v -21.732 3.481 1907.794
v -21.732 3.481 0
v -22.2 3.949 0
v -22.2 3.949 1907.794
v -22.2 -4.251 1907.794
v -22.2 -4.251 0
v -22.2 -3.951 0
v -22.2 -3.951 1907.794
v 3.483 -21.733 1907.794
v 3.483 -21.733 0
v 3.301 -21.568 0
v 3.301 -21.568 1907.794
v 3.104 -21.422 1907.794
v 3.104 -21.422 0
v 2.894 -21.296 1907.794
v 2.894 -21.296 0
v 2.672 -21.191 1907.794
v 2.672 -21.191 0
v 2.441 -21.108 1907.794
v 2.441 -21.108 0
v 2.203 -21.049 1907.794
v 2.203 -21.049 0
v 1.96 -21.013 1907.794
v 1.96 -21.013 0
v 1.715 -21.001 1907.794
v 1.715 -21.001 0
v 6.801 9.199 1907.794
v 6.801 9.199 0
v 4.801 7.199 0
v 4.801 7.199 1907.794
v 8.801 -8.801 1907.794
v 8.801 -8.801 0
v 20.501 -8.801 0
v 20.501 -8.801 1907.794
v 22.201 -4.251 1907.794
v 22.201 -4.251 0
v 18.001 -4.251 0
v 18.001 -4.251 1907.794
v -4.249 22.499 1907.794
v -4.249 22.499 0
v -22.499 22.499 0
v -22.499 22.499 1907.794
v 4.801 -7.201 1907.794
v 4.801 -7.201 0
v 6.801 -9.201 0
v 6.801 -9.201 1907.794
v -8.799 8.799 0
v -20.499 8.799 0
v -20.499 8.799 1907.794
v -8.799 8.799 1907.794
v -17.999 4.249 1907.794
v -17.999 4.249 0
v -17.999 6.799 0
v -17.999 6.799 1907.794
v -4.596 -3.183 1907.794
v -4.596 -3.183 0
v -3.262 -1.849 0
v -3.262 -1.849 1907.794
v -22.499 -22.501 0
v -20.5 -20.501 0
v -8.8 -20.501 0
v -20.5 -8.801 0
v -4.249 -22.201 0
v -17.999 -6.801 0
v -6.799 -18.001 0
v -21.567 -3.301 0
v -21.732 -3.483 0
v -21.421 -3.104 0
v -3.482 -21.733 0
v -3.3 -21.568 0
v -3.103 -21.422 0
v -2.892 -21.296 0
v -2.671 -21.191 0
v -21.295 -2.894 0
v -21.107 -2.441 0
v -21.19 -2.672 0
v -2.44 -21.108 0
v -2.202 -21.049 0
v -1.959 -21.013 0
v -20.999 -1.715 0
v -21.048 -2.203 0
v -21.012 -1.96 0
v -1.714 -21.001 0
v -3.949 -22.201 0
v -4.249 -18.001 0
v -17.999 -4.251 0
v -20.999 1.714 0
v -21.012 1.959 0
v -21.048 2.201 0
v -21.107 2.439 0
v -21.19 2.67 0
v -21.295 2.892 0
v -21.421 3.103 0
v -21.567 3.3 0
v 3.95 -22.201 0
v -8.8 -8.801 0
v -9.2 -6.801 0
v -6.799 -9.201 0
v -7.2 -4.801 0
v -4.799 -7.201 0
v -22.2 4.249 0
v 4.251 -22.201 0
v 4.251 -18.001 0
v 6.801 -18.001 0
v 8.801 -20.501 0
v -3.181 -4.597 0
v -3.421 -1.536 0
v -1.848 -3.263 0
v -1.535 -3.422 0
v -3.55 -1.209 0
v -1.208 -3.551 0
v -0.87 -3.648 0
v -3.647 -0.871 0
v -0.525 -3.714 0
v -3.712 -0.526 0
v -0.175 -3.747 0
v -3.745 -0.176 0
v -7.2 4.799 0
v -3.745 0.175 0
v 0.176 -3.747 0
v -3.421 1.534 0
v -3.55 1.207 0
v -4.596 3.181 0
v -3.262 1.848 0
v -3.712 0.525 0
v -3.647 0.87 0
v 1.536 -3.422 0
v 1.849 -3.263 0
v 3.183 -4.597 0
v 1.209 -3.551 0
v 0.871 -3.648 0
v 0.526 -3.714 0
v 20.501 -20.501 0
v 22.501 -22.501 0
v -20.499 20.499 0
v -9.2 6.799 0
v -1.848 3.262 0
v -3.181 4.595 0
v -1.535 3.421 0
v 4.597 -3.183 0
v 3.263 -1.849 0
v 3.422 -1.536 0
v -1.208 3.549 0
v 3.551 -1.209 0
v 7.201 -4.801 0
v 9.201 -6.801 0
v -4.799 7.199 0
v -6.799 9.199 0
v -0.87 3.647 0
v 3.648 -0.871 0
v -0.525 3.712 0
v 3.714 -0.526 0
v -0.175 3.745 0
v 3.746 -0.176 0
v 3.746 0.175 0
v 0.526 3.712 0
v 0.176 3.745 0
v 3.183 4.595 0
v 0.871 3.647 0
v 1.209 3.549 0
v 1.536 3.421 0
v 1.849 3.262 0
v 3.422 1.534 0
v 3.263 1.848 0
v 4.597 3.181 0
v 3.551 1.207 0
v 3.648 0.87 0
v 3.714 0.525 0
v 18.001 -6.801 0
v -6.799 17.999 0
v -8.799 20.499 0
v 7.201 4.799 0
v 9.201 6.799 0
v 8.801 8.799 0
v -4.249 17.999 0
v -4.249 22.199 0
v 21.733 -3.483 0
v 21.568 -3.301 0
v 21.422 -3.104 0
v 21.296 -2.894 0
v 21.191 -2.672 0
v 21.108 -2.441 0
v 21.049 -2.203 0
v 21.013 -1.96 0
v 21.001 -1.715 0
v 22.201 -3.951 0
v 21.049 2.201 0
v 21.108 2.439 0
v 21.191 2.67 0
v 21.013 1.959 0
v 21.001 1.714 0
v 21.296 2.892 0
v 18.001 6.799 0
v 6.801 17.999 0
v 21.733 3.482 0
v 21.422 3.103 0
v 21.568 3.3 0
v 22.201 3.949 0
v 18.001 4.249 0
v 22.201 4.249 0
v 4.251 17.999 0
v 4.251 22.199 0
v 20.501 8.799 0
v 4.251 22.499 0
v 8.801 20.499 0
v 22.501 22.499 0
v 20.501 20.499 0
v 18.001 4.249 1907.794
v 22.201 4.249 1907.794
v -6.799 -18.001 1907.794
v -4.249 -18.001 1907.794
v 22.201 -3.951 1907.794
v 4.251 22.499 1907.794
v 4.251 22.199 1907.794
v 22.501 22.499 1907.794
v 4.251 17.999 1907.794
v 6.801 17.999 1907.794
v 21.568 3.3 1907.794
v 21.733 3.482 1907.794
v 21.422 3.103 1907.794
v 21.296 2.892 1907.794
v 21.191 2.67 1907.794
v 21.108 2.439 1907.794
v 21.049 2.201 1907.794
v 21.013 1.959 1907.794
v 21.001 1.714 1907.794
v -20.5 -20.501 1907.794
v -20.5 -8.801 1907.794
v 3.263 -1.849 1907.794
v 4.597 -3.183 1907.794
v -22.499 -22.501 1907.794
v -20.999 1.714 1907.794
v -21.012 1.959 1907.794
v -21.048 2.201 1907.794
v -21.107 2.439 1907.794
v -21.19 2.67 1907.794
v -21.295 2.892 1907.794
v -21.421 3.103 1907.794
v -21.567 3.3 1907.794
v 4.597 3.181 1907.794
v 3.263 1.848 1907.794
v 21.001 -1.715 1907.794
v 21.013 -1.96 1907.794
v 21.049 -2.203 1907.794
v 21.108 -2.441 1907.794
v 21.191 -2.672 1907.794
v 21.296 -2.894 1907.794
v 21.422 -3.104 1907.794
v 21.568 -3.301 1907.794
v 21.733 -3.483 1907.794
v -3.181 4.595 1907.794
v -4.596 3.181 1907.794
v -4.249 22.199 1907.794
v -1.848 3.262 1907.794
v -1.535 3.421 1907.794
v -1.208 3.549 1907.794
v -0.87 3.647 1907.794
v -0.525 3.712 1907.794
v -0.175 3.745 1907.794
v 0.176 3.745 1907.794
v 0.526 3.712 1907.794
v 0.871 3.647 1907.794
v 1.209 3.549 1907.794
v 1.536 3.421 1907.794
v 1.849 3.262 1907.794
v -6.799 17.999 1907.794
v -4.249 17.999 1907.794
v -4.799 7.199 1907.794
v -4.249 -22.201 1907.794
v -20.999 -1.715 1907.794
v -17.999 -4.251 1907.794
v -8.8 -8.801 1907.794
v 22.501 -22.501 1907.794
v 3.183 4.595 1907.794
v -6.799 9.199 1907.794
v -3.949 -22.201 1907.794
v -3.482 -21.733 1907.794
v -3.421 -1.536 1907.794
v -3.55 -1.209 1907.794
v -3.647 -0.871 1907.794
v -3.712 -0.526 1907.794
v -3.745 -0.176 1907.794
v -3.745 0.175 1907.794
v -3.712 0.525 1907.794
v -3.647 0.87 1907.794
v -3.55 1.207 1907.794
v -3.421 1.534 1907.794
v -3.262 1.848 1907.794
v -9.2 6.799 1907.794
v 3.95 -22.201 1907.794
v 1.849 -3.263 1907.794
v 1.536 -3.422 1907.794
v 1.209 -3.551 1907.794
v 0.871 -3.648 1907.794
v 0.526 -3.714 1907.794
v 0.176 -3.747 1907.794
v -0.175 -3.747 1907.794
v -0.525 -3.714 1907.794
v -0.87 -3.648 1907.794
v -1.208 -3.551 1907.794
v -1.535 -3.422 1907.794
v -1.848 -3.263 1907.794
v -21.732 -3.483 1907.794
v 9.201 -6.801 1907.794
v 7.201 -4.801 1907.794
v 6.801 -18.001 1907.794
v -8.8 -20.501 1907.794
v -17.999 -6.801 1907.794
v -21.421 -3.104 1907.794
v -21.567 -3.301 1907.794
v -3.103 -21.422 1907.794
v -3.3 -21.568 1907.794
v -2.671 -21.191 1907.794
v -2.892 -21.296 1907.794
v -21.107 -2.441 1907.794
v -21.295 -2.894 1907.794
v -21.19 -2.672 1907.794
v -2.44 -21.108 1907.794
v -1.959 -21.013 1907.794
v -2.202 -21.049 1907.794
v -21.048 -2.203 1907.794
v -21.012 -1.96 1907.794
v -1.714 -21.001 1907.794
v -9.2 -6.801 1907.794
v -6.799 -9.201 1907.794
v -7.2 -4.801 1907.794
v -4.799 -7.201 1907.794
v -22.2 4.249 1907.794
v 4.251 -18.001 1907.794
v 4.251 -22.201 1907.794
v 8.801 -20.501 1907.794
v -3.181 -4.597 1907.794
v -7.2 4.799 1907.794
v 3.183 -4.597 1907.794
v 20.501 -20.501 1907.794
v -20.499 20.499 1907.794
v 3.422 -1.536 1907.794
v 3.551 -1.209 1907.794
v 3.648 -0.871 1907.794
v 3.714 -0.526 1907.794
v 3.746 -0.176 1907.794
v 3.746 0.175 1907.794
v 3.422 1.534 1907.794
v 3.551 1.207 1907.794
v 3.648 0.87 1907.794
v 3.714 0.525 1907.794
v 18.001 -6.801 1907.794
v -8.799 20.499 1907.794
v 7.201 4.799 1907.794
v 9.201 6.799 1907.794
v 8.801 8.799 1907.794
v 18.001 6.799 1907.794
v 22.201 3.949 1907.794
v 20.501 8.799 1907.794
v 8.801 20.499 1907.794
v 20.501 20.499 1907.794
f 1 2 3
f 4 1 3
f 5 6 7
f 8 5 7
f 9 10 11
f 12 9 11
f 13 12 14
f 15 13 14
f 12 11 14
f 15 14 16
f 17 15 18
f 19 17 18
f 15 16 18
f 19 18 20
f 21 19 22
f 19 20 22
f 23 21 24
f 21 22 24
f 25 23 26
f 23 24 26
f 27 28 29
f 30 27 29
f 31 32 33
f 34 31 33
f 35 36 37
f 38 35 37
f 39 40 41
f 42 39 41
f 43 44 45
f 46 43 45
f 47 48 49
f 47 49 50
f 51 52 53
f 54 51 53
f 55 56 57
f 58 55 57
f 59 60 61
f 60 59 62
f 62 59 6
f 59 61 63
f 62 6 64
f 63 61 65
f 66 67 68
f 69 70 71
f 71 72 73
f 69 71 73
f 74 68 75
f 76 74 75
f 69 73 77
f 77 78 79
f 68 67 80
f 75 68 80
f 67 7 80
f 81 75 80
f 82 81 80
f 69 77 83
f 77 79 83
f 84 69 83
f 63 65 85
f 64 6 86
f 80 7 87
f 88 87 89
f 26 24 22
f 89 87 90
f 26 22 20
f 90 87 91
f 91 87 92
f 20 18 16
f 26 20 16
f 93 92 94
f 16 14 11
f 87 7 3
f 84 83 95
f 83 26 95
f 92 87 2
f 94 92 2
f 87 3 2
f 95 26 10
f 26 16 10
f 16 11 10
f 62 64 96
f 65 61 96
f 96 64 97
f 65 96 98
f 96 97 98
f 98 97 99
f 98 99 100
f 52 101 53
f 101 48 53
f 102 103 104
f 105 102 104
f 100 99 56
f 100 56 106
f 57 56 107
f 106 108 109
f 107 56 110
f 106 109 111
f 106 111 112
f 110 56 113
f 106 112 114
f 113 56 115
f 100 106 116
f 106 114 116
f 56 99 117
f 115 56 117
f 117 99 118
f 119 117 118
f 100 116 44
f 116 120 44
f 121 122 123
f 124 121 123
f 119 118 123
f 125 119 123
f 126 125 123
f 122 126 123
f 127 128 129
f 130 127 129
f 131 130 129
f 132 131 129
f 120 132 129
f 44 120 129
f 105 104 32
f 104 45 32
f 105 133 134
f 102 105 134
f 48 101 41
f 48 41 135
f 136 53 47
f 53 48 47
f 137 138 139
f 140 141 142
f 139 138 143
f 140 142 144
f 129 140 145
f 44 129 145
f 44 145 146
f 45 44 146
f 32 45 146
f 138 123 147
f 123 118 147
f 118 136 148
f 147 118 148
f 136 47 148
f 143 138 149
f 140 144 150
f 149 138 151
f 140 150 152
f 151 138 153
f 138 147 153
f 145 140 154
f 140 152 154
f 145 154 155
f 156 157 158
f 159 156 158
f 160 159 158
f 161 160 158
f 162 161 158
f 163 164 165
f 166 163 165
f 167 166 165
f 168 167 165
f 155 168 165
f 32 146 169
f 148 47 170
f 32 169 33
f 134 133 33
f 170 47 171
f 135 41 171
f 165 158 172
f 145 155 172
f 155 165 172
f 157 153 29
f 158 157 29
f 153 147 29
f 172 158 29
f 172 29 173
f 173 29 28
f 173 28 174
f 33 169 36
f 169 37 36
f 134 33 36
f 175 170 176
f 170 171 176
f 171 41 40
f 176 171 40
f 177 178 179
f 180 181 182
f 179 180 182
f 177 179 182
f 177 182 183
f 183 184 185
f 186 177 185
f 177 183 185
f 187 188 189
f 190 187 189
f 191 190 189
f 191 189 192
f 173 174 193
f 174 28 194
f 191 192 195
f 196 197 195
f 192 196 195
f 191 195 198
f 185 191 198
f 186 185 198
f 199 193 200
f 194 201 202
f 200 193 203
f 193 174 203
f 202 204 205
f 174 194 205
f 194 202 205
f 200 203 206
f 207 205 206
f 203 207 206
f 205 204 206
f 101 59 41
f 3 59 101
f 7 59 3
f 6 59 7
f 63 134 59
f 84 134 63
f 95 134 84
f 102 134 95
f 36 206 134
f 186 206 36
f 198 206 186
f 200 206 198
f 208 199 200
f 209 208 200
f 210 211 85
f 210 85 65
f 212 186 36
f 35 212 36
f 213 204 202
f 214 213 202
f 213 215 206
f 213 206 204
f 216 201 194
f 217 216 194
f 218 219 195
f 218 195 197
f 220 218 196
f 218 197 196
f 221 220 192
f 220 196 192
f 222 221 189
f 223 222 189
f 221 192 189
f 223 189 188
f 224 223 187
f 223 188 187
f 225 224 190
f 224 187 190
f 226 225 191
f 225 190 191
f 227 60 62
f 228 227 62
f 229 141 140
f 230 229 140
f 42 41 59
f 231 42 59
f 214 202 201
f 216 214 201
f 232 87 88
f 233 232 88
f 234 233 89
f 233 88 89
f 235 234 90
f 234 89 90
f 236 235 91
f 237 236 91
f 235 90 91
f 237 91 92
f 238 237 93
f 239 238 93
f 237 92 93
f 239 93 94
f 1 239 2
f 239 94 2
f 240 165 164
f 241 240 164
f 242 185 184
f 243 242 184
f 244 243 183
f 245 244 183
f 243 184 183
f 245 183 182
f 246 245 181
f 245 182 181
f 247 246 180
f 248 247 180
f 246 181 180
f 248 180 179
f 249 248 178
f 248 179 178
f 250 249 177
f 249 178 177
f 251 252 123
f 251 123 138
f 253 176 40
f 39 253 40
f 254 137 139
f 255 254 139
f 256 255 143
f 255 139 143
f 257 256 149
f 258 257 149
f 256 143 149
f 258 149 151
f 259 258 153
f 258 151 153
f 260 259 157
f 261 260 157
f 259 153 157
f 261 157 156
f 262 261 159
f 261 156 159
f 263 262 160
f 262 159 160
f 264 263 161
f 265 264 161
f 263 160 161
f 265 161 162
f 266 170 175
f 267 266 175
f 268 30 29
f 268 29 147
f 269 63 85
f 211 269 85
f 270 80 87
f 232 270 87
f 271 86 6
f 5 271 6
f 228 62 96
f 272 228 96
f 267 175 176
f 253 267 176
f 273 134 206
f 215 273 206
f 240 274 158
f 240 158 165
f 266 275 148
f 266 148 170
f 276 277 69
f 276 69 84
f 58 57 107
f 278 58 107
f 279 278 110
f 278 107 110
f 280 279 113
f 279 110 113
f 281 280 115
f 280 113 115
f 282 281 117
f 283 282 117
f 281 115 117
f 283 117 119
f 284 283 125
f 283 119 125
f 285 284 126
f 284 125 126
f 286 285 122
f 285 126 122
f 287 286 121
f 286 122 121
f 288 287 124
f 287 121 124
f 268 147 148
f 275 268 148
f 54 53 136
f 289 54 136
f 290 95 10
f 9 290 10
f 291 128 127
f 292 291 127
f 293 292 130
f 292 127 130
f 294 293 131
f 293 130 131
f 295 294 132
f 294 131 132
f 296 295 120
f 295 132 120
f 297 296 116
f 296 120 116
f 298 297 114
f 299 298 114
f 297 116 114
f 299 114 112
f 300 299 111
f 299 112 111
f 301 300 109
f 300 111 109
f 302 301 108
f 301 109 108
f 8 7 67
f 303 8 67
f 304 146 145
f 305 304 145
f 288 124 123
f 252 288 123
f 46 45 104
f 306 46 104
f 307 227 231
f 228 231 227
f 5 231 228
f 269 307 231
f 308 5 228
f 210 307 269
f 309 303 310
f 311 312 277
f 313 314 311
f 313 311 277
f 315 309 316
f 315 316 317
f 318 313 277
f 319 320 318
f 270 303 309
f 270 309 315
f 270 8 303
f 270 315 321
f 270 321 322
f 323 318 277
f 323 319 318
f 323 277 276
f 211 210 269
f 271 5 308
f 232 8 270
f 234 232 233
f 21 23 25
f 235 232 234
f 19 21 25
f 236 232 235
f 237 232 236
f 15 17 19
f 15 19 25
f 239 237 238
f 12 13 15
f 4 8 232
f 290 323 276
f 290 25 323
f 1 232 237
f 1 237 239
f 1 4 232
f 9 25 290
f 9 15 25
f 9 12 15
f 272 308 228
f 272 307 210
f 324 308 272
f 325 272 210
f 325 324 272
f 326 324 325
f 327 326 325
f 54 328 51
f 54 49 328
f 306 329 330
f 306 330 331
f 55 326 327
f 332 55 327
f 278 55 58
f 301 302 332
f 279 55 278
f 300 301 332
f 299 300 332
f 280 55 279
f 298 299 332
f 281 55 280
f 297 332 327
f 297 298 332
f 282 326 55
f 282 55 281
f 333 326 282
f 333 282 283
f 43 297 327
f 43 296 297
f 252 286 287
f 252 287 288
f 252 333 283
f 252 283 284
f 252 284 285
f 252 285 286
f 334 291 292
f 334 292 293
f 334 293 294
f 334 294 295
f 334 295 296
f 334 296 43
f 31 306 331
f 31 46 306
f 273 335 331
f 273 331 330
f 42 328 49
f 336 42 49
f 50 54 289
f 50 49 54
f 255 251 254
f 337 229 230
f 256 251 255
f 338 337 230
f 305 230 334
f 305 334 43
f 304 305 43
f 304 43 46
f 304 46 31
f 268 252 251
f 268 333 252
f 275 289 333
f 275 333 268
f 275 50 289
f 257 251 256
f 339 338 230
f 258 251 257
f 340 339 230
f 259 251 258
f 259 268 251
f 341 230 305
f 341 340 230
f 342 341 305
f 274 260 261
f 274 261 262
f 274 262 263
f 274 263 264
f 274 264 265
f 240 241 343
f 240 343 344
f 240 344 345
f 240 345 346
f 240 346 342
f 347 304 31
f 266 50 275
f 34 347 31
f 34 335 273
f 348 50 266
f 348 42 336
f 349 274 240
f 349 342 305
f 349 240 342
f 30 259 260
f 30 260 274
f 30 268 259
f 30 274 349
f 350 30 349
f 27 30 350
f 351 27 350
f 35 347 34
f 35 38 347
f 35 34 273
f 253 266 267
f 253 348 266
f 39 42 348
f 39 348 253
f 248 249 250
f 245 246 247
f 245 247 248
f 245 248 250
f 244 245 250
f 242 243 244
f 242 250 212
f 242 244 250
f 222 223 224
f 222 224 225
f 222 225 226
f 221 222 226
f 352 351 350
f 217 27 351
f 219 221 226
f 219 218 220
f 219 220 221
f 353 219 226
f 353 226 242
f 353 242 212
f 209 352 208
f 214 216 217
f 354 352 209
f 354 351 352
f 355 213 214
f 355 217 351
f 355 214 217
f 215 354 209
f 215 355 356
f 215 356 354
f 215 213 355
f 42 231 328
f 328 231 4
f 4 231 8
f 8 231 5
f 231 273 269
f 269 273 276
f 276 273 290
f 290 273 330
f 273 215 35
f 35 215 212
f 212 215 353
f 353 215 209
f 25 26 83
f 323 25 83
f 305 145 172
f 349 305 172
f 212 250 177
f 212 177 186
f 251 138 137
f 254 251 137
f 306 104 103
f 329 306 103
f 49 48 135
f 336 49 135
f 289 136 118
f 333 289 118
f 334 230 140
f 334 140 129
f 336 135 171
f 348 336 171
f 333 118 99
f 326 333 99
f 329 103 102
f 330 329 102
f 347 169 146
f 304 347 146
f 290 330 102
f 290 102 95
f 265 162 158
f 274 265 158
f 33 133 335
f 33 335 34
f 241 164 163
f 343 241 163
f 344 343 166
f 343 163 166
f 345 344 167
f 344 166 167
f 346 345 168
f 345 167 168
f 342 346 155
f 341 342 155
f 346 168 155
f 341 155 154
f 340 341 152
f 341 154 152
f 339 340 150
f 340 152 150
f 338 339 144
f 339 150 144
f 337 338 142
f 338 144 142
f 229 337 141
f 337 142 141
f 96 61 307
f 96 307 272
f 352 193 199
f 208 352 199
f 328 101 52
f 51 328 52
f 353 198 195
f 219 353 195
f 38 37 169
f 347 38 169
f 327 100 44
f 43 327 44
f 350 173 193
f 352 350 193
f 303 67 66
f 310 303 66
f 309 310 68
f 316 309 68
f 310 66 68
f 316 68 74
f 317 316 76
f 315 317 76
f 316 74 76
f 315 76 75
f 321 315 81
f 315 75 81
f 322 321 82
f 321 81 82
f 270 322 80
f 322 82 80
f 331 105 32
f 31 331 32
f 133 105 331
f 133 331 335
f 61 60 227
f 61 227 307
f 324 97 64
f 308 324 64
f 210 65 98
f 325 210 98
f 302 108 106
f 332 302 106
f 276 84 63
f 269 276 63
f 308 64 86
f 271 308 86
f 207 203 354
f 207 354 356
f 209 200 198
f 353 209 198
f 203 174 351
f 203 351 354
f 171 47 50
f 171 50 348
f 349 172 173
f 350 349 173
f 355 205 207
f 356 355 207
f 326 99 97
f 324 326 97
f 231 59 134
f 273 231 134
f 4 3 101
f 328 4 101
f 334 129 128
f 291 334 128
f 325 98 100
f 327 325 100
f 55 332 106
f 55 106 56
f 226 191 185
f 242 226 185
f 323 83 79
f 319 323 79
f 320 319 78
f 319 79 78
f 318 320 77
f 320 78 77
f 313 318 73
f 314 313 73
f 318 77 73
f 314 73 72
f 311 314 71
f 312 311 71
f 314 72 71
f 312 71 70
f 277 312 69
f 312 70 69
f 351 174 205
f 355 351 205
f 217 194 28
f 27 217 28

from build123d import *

# Parameters (mm, degrees)
SKETCH1_W           = 11.699975178
SKETCH1_H           = 11.699996949
SKETCH1_W_2         = 11.699990436
SKETCH1_H_2         = 11.699981689
SKETCH1_W_3         = 11.699990437
SKETCH1_H_3         = 11.699975177
SKETCH1_W_4         = 11.699981689
SKETCH1_H_4         = 11.699990436
BOSS_EXTRUDE1_DEPTH = 1907.794


with BuildPart() as part:
    # Sketch1 → Boss-Extrude1 (new body)
    with BuildSketch(Plane.XY):
        Polygon((-4.249491247, 17.999291576), (-4.249490956, 22.199304807), (-4.249490956, 22.499297883), (-22.499484399, 22.499298105), (-22.499484948, -22.500701346), (22.500514502, -22.500701895), (22.500515052, 22.499297556), (4.250509108, 22.499297779), (4.250509108, 22.199304487), (4.250508817, 17.999291575), (6.800527063, 17.999291575), (6.800526453, 9.199302988), (4.800526064, 7.199302969), (-4.799479817, 7.199303635), (-6.799479854, 9.199304042), (-6.799479244, 17.999291576), align=None)
        with Locations((-14.649542346, -14.650709384)):
            Rectangle(SKETCH1_W, SKETCH1_H, mode=Mode.SUBTRACT)
        with BuildLine():
            Line((-22.199510799, -4.250714391), (-22.199510799, -3.950696126))
            Line((-22.199510799, -3.950696126), (-21.731790056, -3.48300681))
            ThreePointArc((-21.731790056, -3.48300681), (-21.189814855, -2.671927844), (-20.999497617, -1.71518046))
            Line((-20.999497617, -1.71518046), (-20.999497617, 1.713721031))
            ThreePointArc((-20.999497617, 1.713721031), (-21.189799286, 2.670430863), (-21.731732544, 3.481489907))
            Line((-21.731732544, 3.481489907), (-22.199510888, 3.949267256))
            Line((-22.199510888, 3.949267256), (-22.199510888, 4.249285566))
            Line((-22.199510888, 4.249285566), (-17.999497356, 4.249285704))
            Line((-17.999497356, 4.249285704), (-17.999497356, 6.79927354))
            Line((-17.999497356, 6.79927354), (-9.199509947, 6.799273828))
            Line((-9.199509947, 6.799273828), (-7.199509956, 4.799274012))
            Line((-7.199509956, 4.799274012), (-7.199509641, -4.800732197))
            Line((-7.199509641, -4.800732197), (-9.199509449, -6.800732179))
            Line((-9.199509449, -6.800732179), (-17.99949762, -6.800732468))
            Line((-17.99949762, -6.800732468), (-17.99949762, -4.250714253))
            Line((-17.99949762, -4.250714253), (-22.199510799, -4.250714391))
        make_face(mode=Mode.SUBTRACT)
        with BuildLine():
            Line((-4.24949208, -18.000719999), (-6.799479919, -18.000719999))
            Line((-6.799479919, -18.000719999), (-6.799480207, -9.200732353))
            Line((-6.799480207, -9.200732353), (-4.799480391, -7.200732362))
            Line((-4.799480391, -7.200732362), (4.800525817, -7.200732047))
            Line((4.800525817, -7.200732047), (6.8005258, -9.200731855))
            Line((6.8005258, -9.200731855), (6.800526088, -18.000720263))
            Line((6.800526088, -18.000720263), (4.250507877, -18.000720263))
            Line((4.250507877, -18.000720263), (4.250508015, -22.200733153))
            Line((4.250508015, -22.200733153), (3.950489751, -22.200733153))
            Line((3.950489751, -22.200733153), (3.482800434, -21.73301241))
            ThreePointArc((3.482800434, -21.73301241), (2.671721468, -21.191037209), (1.714974084, -21.000719971))
            Line((1.714974084, -21.000719971), (-1.713927407, -21.000719971))
            ThreePointArc((-1.713927407, -21.000719971), (-2.670637239, -21.19102164), (-3.481696283, -21.732954898))
            Line((-3.481696283, -21.732954898), (-3.949473632, -22.200733242))
            Line((-3.949473632, -22.200733242), (-4.249491942, -22.200733242))
            Line((-4.249491942, -22.200733242), (-4.24949208, -18.000719999))
        make_face(mode=Mode.SUBTRACT)
        with Locations((14.65050626, -14.650767962)):
            Rectangle(SKETCH1_W_2, SKETCH1_H_2, mode=Mode.SUBTRACT)
        with BuildLine():
            Line((-3.181457266, -4.596908447), (-4.595670829, -3.182694885))
            Line((-4.595670829, -3.182694885), (-3.26221457, -1.849238626))
            ThreePointArc((-3.26221457, -1.849238626), (-3.749476751, -0.00071437), (-3.26221457, 1.847809887))
            Line((-3.26221457, 1.847809887), (-4.595670829, 3.181266146))
            Line((-4.595670829, 3.181266146), (-3.181457266, 4.595479708))
            Line((-3.181457266, 4.595479708), (-1.848001007, 3.262023449))
            ThreePointArc((-1.848001007, 3.262023449), (0.000523249, 3.74928563), (1.849047505, 3.262023449))
            Line((1.849047505, 3.262023449), (3.182503764, 4.595479708))
            Line((3.182503764, 4.595479708), (4.596717327, 3.181266146))
            Line((4.596717327, 3.181266146), (3.263261068, 1.847809887))
            ThreePointArc((3.263261068, 1.847809887), (3.750523249, -0.00071437), (3.263261068, -1.849238626))
            Line((3.263261068, -1.849238626), (4.596717327, -3.182694885))
            Line((4.596717327, -3.182694885), (3.182503764, -4.596908447))
            Line((3.182503764, -4.596908447), (1.849047505, -3.263452188))
            ThreePointArc((1.849047505, -3.263452188), (0.000523249, -3.75071437), (-1.848001007, -3.263452188))
            Line((-1.848001007, -3.263452188), (-3.181457266, -4.596908447))
        make_face(mode=Mode.SUBTRACT)
        with Locations((-14.64949028, 14.649335967)):
            Rectangle(SKETCH1_W_3, SKETCH1_H_3, mode=Mode.SUBTRACT)
        with BuildLine():
            Line((9.200519462, -6.800702567), (7.200519471, -4.800702751))
            Line((7.200519471, -4.800702751), (7.200519156, 4.799303458))
            Line((7.200519156, 4.799303458), (9.200518964, 6.79930344))
            Line((9.200518964, 6.79930344), (18.000507424, 6.799303729))
            Line((18.000507424, 6.799303729), (18.000507424, 4.249285514))
            Line((18.000507424, 4.249285514), (22.200520261, 4.249285652))
            Line((22.200520261, 4.249285652), (22.200520261, 3.949267391))
            Line((22.200520261, 3.949267391), (21.732799519, 3.481578075))
            ThreePointArc((21.732799519, 3.481578075), (21.190824318, 2.670499108), (21.000507079, 1.713751724))
            Line((21.000507079, 1.713751724), (21.000507079, -1.715149766))
            ThreePointArc((21.000507079, -1.715149766), (21.190808749, -2.671859599), (21.732742007, -3.482918643))
            Line((21.732742007, -3.482918643), (22.200520351, -3.950695992))
            Line((22.200520351, -3.950695992), (22.200520351, -4.250714302))
            Line((22.200520351, -4.250714302), (18.000507108, -4.25071444))
            Line((18.000507108, -4.25071444), (18.000507108, -6.800702279))
            Line((18.000507108, -6.800702279), (9.200519462, -6.800702567))
        make_face(mode=Mode.SUBTRACT)
        with Locations((14.650561583, 14.6492839)):
            Rectangle(SKETCH1_W_4, SKETCH1_H_4, mode=Mode.SUBTRACT)
    extrude(amount=BOSS_EXTRUDE1_DEPTH)


solid = part.part
